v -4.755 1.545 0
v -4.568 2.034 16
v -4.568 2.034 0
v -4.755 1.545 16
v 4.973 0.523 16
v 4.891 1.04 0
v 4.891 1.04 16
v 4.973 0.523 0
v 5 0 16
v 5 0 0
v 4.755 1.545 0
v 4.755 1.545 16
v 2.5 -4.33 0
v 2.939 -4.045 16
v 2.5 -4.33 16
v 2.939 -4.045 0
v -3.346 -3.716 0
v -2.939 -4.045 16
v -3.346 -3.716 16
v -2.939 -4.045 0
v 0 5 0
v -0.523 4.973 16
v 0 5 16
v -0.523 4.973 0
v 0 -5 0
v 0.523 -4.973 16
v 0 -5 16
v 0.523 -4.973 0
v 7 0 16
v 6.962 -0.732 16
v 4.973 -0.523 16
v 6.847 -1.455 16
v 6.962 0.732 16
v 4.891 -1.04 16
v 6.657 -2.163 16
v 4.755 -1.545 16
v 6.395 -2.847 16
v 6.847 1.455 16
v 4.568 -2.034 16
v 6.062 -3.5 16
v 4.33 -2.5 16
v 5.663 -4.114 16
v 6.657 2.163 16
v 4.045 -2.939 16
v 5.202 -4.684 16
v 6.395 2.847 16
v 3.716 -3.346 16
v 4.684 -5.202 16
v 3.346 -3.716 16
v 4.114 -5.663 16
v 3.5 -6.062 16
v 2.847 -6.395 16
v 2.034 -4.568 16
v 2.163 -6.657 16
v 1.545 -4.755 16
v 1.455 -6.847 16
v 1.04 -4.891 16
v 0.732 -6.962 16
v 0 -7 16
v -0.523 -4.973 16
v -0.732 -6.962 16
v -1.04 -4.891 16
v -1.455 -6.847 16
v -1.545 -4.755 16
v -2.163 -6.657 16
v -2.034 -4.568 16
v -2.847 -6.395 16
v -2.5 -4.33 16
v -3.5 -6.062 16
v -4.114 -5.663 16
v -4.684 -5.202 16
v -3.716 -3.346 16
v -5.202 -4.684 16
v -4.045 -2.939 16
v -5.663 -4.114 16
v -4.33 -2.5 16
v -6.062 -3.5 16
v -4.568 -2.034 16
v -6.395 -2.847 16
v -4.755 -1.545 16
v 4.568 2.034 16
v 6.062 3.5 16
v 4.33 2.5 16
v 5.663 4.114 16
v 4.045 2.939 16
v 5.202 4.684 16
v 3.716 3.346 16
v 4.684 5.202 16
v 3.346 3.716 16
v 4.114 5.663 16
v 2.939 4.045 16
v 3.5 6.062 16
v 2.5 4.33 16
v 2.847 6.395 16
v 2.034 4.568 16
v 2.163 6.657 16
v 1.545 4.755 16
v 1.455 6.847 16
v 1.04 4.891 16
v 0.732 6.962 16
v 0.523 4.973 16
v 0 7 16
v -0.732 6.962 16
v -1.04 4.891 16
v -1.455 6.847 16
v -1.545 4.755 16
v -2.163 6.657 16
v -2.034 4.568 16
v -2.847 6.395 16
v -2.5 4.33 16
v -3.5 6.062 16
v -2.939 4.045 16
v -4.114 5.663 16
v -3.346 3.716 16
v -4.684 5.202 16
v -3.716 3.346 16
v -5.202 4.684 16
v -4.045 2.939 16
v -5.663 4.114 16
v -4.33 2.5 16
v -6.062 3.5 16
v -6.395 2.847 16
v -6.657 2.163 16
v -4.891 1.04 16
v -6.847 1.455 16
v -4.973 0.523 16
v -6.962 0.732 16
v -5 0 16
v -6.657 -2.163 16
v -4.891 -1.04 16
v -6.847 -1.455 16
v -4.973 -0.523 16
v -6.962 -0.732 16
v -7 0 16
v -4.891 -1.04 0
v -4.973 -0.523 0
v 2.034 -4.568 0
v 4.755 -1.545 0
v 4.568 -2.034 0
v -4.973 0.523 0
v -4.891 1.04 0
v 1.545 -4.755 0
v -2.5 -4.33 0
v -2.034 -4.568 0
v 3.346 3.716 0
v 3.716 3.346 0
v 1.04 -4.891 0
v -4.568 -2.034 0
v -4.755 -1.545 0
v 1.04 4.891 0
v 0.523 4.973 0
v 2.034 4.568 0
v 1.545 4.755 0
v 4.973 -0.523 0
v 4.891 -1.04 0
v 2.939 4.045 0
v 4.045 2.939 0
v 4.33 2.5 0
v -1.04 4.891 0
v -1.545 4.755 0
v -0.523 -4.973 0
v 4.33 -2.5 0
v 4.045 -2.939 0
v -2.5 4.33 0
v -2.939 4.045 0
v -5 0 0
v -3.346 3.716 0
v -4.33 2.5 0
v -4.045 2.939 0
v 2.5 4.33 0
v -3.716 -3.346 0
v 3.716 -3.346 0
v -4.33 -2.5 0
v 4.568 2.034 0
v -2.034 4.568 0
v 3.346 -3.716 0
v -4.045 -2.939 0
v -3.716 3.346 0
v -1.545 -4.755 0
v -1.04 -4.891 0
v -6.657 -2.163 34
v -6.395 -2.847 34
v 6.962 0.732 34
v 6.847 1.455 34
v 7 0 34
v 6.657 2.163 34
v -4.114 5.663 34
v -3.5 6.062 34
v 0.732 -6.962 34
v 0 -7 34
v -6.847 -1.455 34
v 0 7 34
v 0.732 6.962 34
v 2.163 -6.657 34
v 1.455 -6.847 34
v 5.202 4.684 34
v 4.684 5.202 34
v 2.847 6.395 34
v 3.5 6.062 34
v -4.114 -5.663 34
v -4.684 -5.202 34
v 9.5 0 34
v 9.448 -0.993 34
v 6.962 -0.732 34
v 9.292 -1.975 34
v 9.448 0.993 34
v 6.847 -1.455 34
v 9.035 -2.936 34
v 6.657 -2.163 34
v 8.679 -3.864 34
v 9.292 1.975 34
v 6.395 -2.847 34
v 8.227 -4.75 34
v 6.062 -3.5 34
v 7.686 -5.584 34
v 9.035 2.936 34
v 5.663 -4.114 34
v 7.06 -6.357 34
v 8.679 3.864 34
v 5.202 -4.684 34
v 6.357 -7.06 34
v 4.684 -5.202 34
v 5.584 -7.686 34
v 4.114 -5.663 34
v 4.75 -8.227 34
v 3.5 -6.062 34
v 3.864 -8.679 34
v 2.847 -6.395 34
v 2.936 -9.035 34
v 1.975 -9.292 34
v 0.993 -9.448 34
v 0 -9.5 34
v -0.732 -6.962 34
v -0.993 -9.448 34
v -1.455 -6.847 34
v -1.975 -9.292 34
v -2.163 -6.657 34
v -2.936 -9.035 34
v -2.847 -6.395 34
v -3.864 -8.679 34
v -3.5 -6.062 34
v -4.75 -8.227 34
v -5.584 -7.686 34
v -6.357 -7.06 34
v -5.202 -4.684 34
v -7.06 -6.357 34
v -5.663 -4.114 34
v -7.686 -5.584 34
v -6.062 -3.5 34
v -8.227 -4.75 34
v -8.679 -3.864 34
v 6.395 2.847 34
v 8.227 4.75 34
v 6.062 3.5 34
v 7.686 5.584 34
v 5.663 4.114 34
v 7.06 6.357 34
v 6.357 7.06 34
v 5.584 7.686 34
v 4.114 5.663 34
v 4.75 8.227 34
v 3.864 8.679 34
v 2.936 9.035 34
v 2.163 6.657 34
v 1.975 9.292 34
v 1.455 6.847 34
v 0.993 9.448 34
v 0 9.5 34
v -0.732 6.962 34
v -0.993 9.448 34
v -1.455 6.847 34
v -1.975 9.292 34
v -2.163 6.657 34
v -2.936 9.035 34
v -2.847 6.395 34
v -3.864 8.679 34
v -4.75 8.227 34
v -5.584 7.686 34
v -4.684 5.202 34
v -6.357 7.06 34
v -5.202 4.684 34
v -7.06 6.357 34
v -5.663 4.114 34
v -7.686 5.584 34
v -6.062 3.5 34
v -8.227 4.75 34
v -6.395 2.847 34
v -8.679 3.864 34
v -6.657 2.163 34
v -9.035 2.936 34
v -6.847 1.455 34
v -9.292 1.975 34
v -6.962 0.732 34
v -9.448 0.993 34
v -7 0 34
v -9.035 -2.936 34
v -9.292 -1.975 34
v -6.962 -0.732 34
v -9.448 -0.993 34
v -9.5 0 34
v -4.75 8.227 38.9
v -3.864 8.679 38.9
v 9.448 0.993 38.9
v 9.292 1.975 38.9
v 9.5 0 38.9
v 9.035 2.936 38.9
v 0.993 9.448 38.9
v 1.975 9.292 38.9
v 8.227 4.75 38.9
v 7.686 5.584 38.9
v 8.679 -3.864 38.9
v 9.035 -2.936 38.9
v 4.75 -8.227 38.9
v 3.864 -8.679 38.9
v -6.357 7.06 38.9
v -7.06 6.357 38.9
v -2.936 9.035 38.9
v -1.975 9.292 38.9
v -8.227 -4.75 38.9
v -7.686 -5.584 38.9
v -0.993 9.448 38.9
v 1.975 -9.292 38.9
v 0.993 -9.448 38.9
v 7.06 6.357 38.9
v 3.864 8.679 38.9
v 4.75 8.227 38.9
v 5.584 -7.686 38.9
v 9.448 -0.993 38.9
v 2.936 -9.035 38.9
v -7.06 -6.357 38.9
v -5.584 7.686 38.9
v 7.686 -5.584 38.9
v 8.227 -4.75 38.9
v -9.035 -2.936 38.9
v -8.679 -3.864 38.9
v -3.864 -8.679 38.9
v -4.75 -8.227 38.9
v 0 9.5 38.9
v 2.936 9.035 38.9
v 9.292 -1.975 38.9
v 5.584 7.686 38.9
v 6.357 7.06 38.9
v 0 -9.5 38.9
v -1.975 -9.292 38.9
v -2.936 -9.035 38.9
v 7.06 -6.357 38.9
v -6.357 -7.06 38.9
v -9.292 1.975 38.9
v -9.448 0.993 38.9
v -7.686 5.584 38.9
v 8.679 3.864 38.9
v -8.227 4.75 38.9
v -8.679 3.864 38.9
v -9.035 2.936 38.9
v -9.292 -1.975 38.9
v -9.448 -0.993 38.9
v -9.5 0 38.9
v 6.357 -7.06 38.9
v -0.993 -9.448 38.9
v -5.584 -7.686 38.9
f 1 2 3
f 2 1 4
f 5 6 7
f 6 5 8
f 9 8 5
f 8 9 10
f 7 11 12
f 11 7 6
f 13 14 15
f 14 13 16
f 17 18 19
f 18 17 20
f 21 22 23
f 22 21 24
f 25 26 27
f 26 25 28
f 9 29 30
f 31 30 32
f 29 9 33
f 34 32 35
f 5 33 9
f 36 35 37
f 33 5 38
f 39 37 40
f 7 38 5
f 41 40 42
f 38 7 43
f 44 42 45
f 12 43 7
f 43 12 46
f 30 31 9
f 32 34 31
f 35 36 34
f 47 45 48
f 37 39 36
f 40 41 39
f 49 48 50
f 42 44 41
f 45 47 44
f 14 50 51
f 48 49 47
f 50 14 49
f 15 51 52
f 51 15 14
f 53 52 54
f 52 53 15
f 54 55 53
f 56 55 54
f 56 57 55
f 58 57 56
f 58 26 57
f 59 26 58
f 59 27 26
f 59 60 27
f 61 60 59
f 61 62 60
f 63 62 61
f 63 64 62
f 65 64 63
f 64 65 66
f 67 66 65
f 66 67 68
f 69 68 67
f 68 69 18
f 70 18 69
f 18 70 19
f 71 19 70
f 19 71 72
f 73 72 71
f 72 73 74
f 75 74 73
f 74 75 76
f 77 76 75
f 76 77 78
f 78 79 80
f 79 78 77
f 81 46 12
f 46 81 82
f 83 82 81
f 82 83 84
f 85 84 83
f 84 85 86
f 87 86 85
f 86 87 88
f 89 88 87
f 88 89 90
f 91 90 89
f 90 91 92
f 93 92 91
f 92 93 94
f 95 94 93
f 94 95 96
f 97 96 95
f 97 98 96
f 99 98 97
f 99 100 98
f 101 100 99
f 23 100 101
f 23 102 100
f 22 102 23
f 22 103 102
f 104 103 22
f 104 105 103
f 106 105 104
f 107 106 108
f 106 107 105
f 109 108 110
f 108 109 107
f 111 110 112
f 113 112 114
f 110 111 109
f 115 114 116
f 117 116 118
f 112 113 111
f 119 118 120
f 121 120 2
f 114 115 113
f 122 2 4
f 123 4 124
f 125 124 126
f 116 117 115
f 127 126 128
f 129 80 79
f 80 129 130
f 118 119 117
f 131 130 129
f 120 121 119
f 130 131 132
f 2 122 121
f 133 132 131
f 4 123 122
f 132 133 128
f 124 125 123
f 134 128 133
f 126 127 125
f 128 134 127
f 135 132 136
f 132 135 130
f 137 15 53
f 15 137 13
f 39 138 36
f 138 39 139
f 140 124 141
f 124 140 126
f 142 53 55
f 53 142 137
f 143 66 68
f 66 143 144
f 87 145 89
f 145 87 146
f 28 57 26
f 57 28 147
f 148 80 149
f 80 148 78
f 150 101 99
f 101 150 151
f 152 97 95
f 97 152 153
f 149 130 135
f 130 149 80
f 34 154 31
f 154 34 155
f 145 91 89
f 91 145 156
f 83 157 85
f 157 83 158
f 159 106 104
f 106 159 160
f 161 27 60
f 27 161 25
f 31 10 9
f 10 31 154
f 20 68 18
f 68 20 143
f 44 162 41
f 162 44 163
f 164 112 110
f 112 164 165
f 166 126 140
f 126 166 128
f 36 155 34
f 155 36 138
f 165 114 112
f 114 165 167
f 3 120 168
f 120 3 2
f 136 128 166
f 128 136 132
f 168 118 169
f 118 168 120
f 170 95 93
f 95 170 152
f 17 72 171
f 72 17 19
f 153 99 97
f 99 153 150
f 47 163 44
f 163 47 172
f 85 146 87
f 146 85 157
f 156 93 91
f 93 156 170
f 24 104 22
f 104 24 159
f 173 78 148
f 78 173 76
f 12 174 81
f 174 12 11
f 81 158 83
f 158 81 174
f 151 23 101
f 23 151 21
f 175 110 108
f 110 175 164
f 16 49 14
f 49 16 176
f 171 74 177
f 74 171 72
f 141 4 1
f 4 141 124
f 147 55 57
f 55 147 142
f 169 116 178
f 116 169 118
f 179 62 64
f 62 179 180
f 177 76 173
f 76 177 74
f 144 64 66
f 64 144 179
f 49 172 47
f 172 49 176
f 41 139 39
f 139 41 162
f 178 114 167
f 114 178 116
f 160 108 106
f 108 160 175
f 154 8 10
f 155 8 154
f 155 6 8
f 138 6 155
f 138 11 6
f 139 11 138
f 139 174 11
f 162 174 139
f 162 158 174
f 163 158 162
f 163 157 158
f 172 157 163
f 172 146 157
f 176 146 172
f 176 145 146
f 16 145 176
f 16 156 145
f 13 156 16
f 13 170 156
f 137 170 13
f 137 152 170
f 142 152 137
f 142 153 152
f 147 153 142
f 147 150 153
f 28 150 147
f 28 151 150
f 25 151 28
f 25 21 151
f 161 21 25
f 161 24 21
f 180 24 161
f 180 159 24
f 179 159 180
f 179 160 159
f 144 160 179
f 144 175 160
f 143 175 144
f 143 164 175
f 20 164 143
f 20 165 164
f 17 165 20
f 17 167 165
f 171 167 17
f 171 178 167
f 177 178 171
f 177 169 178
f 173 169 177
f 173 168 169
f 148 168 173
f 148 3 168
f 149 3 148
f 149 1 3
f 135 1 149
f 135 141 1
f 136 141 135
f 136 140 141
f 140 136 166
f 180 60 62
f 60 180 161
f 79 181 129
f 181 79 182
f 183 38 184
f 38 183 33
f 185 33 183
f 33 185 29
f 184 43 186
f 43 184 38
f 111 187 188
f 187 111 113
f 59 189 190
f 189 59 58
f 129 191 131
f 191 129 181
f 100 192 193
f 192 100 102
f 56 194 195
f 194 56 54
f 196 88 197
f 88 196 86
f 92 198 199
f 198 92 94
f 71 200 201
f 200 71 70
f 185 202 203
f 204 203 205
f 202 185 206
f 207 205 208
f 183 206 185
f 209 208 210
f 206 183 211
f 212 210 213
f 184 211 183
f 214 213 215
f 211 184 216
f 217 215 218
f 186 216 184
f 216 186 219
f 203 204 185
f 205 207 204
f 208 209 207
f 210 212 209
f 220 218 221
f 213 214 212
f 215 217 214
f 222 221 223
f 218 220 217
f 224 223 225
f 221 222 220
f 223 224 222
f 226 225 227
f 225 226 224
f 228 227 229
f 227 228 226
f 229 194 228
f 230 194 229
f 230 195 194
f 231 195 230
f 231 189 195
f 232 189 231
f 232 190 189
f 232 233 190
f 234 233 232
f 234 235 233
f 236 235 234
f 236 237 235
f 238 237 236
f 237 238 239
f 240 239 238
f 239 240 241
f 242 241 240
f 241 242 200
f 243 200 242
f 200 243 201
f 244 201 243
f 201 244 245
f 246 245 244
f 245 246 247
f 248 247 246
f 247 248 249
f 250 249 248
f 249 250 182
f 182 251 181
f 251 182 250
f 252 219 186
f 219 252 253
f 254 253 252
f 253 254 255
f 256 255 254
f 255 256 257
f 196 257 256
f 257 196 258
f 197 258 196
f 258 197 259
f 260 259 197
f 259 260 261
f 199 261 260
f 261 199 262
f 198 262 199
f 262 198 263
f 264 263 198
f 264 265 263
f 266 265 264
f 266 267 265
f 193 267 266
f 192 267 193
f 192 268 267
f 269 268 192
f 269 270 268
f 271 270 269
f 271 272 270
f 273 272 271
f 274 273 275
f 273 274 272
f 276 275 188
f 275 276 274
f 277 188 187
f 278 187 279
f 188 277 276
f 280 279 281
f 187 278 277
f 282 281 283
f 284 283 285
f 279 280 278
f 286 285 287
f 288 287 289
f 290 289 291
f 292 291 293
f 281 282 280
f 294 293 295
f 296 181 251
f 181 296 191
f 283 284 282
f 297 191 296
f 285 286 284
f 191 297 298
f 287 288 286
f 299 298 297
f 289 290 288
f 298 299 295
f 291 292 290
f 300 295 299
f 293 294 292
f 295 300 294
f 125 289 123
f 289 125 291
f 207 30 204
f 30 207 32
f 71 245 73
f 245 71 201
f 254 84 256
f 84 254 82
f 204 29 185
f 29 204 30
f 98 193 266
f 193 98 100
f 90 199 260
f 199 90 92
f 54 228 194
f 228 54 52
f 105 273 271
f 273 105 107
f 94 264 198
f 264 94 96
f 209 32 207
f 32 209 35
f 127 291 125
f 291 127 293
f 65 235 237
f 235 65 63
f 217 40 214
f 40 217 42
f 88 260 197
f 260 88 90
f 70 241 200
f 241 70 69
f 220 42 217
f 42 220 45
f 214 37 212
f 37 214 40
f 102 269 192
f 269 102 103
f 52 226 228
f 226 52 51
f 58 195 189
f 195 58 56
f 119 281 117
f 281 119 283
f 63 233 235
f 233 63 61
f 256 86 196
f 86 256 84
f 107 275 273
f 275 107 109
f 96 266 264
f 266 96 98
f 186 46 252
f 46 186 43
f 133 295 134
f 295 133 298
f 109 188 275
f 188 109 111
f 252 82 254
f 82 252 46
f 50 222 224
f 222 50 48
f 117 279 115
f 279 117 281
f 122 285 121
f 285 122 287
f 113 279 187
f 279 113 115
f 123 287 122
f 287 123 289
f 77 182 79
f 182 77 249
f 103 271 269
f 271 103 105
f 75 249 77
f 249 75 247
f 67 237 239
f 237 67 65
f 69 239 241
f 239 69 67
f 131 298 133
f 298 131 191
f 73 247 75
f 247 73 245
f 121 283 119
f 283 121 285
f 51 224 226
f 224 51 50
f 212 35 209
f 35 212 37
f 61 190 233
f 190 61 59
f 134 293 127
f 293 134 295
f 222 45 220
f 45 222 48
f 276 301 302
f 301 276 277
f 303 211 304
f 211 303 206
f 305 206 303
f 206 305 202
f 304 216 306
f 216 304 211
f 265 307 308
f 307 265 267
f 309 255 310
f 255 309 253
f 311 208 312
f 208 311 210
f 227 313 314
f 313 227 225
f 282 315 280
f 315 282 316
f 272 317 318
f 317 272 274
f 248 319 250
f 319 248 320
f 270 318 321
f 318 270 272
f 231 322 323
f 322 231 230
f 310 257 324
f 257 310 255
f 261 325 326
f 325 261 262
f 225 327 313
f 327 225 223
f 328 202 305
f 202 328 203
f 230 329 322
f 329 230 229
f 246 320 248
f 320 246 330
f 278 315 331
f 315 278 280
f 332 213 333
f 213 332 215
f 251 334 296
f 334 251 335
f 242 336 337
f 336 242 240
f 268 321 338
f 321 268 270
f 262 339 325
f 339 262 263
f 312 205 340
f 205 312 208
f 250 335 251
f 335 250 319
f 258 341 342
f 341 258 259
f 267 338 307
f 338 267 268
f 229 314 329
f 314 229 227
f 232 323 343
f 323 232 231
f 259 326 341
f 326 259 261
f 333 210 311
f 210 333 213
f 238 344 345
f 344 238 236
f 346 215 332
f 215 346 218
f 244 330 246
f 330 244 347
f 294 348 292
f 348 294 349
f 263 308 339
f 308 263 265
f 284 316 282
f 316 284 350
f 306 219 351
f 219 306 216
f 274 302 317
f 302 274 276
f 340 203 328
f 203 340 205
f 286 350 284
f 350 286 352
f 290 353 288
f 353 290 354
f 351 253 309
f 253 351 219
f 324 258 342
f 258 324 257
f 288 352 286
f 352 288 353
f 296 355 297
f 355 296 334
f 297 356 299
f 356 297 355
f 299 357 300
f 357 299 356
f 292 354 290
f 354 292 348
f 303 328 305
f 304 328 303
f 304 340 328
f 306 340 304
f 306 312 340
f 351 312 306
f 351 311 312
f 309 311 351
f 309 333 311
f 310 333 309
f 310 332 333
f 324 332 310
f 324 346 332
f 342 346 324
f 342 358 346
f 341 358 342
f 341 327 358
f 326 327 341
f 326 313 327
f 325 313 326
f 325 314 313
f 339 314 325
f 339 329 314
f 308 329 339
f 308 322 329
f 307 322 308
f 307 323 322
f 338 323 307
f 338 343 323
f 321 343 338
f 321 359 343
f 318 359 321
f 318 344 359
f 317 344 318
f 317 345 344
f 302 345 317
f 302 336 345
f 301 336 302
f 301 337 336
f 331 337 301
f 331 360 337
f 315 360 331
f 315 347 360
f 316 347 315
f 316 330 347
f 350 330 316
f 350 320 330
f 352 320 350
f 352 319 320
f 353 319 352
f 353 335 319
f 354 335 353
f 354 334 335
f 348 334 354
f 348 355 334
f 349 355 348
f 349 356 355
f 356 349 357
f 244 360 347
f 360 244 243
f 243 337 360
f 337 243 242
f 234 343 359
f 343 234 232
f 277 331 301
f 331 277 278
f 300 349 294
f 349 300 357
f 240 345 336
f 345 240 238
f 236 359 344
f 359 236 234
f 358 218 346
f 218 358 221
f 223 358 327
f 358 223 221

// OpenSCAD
// Shoulder bolt.
$fn = 60;
eps = 0.02;
thread_d = 10;
shoulder_d = 14;
shoulder_l = 18;
thread_l = 16;
head_d = shoulder_d + 5;
union() {
    cylinder(d=thread_d,h=thread_l);
    translate([0,0,thread_l]) cylinder(d=shoulder_d,h=shoulder_l);
    translate([0,0,thread_l+shoulder_l]) cylinder(d=head_d,h=shoulder_d*0.35);
}
